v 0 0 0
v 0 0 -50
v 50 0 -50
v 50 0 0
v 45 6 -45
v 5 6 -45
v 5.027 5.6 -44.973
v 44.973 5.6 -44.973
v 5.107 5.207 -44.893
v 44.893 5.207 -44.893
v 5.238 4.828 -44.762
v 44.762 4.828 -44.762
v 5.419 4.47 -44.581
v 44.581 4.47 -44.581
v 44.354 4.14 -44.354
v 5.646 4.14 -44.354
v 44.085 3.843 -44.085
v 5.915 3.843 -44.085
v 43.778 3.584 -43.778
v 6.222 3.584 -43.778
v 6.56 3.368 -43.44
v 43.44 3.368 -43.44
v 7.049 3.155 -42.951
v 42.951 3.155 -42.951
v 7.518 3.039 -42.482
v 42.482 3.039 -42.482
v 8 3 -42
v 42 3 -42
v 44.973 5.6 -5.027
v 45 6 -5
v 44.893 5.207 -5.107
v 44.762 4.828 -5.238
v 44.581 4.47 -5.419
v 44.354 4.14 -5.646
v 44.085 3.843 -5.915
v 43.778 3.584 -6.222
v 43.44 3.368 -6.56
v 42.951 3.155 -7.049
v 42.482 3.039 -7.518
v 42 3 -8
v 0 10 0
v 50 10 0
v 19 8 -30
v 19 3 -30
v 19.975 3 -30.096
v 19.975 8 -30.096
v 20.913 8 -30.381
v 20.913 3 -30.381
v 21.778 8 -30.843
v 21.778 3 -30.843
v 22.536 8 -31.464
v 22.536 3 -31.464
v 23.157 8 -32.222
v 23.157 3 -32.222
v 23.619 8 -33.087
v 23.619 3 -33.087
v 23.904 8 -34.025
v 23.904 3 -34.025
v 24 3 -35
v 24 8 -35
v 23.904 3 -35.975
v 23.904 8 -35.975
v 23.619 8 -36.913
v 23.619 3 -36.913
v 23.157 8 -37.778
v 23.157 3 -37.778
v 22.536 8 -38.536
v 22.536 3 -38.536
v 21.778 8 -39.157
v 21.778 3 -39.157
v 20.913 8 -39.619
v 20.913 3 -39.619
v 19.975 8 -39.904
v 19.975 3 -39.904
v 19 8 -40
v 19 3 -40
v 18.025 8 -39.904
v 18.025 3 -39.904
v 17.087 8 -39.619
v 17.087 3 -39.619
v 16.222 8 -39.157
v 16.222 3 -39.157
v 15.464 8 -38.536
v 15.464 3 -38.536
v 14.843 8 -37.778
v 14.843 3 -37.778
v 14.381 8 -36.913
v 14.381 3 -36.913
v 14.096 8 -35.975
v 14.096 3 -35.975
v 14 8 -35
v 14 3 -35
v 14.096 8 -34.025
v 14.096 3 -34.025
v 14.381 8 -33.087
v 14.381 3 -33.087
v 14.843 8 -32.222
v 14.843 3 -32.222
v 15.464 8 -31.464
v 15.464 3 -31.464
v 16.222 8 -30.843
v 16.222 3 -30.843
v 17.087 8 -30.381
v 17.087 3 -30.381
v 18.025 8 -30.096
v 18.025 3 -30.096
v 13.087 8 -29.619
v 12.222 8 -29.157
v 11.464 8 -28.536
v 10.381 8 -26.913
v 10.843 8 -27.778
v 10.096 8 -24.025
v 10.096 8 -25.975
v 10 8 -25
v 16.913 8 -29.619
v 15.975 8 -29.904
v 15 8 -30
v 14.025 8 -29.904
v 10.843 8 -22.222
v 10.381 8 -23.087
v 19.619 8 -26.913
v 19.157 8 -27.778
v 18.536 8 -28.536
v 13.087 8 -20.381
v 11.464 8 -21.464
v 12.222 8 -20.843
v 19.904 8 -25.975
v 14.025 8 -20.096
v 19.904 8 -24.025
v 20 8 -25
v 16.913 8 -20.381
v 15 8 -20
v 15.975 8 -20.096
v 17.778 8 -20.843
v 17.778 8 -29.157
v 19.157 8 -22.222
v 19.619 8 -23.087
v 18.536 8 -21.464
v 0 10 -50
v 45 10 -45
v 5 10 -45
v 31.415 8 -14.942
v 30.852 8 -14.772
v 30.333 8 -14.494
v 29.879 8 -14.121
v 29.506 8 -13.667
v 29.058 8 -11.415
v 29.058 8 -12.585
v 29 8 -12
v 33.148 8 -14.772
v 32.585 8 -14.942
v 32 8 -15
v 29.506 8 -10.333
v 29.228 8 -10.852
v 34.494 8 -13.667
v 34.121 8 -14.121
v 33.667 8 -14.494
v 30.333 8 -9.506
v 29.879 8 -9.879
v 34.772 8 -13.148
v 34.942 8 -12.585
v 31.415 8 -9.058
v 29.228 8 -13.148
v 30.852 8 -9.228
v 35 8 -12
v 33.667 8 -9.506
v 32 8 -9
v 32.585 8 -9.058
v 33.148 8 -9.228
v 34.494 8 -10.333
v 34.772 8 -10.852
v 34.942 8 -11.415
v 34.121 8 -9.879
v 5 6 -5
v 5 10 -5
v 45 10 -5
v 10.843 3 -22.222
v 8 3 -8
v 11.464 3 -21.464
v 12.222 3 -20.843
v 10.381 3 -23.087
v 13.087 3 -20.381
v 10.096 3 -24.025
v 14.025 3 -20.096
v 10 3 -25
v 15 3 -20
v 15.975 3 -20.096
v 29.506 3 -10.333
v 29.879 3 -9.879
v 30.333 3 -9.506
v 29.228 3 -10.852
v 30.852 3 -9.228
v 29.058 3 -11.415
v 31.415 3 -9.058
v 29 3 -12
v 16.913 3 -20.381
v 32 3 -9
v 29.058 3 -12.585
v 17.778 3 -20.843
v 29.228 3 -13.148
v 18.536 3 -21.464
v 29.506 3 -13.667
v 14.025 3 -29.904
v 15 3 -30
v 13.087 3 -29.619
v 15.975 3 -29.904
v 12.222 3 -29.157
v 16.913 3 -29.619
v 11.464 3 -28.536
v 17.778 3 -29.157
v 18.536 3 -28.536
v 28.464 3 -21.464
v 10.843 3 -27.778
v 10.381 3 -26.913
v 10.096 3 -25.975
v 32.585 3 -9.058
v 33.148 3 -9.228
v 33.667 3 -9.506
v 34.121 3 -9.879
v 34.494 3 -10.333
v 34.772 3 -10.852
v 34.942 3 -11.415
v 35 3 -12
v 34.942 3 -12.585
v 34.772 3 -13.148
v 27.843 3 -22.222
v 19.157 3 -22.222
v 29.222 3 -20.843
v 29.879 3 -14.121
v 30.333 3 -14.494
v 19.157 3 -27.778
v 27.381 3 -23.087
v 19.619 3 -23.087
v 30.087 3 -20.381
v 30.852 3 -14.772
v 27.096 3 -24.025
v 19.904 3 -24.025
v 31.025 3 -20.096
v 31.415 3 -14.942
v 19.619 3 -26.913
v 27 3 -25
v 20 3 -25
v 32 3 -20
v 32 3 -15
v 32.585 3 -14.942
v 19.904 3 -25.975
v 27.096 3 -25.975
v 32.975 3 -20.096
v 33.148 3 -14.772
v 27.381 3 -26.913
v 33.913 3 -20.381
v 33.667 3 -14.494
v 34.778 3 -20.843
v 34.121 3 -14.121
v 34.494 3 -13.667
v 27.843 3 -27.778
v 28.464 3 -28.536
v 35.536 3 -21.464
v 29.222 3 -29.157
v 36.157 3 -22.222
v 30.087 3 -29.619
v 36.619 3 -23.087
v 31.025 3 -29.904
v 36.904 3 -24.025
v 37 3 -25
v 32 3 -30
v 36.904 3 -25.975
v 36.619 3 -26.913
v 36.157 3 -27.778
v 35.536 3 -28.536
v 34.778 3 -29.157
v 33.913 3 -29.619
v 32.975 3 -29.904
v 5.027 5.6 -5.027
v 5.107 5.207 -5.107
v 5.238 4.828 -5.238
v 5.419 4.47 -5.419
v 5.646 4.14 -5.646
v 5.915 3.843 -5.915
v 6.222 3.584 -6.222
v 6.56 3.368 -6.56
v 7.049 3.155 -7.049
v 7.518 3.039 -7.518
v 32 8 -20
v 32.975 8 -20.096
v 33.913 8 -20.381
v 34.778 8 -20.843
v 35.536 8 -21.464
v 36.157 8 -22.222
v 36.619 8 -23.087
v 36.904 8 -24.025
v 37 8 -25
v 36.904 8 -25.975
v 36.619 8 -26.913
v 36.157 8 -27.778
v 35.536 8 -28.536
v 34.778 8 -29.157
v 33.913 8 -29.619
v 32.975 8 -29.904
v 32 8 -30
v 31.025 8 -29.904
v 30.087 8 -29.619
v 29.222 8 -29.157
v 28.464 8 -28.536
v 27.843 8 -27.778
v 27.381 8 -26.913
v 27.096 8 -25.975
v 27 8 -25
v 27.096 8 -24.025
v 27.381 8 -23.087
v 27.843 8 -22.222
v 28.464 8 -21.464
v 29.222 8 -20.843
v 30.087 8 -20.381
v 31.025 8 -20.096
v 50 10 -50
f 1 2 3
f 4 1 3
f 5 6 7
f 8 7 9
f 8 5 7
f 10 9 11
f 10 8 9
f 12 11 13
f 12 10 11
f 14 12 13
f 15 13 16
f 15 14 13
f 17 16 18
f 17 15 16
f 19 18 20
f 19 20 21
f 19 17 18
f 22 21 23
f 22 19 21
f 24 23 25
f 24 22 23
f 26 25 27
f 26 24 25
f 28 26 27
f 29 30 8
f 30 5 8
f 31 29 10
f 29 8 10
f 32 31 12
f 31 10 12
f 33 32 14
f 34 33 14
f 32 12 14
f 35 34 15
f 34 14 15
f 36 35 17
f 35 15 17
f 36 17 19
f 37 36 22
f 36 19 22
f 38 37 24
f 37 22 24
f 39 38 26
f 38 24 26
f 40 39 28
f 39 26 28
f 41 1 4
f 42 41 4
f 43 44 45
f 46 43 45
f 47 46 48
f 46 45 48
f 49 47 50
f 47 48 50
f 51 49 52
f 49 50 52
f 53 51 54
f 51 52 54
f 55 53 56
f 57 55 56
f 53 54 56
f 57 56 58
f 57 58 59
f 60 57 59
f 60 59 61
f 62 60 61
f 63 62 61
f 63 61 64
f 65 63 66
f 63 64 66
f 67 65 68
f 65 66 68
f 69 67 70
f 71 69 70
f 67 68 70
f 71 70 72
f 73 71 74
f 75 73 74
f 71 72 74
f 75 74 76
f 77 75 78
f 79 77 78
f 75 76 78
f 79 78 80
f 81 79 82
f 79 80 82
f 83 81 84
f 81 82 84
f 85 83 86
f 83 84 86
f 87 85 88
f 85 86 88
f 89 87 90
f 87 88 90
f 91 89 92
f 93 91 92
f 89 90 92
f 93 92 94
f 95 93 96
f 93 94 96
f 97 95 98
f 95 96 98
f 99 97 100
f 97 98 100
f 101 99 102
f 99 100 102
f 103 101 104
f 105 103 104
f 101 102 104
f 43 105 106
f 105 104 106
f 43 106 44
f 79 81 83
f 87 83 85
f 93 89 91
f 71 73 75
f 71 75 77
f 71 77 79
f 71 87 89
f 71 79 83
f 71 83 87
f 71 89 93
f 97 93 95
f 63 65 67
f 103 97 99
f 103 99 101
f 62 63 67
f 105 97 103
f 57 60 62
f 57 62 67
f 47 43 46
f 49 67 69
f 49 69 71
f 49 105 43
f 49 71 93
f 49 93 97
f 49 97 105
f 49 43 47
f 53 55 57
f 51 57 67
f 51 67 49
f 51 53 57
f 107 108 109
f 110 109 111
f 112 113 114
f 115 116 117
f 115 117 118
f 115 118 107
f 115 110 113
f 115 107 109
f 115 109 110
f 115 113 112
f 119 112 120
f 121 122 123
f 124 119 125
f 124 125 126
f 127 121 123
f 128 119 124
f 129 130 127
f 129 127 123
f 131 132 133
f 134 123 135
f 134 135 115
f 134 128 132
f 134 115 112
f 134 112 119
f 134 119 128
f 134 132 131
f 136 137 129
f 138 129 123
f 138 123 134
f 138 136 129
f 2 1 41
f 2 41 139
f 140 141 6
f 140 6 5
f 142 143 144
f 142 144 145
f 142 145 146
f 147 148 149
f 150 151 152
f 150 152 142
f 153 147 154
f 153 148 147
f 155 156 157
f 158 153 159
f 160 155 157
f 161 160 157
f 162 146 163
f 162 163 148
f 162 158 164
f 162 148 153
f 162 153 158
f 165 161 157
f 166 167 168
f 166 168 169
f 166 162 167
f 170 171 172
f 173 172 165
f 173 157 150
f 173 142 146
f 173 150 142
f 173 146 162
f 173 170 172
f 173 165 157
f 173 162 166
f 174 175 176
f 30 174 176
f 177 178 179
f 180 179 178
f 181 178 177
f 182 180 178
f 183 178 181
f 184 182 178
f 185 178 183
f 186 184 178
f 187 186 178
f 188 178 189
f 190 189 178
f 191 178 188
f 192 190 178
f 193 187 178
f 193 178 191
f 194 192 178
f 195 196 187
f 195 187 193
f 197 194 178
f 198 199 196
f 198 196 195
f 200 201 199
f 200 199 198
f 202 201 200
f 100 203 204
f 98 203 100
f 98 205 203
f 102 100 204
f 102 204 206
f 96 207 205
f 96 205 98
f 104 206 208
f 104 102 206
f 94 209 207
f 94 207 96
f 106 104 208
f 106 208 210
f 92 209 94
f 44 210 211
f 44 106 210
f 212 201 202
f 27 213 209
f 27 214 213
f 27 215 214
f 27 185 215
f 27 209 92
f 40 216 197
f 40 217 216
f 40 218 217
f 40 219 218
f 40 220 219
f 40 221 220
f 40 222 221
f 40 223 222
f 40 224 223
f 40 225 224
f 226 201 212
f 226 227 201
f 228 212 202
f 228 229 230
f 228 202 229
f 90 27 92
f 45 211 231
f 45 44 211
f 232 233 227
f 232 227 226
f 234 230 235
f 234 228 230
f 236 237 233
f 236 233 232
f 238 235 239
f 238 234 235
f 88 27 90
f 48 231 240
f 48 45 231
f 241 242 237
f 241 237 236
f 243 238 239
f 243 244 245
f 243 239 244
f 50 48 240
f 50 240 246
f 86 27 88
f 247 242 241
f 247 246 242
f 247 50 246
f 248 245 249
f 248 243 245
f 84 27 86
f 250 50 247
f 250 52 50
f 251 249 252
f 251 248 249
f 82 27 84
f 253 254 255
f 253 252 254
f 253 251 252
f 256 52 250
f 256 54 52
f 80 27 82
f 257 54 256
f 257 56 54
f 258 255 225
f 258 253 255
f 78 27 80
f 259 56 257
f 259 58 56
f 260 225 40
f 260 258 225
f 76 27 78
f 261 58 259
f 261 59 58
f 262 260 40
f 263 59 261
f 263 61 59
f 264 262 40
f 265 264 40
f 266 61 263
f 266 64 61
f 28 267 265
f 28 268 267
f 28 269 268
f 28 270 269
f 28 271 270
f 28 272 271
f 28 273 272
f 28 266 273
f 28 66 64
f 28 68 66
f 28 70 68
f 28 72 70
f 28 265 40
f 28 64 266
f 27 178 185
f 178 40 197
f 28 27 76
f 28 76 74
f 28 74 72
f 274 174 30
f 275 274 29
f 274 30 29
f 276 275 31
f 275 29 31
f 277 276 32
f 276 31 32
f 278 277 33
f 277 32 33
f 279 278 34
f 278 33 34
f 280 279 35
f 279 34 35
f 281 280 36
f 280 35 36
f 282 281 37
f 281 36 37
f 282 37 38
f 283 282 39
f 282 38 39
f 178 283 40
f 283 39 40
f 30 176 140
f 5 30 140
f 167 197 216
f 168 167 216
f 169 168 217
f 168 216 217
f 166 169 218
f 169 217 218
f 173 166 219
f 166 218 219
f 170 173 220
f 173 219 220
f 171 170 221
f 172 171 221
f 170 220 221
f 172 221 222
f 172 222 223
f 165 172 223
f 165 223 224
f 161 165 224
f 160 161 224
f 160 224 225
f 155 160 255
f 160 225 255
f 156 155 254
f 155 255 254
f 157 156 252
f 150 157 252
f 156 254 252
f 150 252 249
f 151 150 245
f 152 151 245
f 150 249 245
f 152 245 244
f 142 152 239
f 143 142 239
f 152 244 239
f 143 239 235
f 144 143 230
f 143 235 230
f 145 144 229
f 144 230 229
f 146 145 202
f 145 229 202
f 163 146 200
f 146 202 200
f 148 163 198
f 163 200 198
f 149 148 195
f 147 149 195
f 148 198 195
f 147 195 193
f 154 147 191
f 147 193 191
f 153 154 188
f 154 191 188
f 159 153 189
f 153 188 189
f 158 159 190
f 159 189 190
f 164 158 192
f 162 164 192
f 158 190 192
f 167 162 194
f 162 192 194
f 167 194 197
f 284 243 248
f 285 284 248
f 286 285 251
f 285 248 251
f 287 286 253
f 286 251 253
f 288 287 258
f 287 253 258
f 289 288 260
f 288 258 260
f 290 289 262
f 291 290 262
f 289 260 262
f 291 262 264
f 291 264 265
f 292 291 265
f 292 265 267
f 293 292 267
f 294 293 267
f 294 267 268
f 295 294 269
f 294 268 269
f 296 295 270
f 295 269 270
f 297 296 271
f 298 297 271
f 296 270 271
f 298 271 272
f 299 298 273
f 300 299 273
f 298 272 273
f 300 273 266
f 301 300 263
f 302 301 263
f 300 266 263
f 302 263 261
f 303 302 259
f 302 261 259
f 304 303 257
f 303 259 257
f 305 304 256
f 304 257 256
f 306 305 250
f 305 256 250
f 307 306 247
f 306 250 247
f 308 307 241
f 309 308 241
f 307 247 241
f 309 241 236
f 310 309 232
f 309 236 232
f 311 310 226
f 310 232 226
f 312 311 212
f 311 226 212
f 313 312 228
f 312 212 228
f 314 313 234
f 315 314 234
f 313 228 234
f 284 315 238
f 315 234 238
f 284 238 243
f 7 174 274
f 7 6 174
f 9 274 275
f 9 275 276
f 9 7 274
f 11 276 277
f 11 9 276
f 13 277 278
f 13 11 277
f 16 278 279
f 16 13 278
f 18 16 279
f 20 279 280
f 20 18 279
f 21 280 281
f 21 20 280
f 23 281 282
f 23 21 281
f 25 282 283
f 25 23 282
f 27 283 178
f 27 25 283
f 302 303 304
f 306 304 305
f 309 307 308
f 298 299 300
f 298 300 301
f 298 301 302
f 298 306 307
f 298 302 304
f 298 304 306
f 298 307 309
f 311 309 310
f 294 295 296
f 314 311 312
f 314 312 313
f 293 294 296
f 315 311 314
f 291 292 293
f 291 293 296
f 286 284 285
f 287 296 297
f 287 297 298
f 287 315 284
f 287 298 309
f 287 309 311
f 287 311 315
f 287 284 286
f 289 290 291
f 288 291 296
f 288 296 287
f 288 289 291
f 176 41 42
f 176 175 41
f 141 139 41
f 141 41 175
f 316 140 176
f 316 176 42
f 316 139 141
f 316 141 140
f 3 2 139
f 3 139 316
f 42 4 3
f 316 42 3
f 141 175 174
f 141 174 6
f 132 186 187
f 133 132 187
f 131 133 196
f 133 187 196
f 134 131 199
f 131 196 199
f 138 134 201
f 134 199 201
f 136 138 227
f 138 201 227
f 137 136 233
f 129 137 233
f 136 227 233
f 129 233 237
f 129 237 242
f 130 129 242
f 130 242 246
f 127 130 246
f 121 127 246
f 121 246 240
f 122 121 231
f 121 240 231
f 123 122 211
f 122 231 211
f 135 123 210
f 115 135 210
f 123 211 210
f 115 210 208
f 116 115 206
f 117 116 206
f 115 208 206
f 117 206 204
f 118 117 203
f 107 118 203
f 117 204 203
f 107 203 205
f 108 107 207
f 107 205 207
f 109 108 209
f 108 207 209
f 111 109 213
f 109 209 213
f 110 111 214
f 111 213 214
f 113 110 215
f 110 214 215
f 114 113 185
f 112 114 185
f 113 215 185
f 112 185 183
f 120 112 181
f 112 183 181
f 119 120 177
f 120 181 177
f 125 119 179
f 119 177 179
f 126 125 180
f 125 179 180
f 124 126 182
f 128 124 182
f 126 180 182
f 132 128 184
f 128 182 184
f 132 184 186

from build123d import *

# Parameters (mm, degrees)
SKETCH1_W           = 50
SKETCH1_H           = 50
BOSS_EXTRUDE1_DEPTH = 10
SKETCH2_W           = 40
SKETCH2_H           = 40
CUT_EXTRUDE1_DEPTH  = 7
FILLET1_R           = 3
SKETCH3_R           = 5
SKETCH3_R_2         = 3
BOSS_EXTRUDE2_DEPTH = 5


with BuildPart() as part:
    # Sketch1 → Boss-Extrude1 (new body)
    with BuildSketch(Plane(origin=(0, 0, 0), x_dir=(1, 0, 0), z_dir=(0, 1, 0))):
        with Locations((25, 25)):
            Rectangle(SKETCH1_W, SKETCH1_H)
    extrude(amount=BOSS_EXTRUDE1_DEPTH)

    # Sketch2 → Cut-Extrude1 (cut)
    with BuildSketch(Plane(origin=(0, 10, 0), x_dir=(1, 0, 0), z_dir=(0, 1, 0))):
        with Locations((25, 25)):
            Rectangle(SKETCH2_W, SKETCH2_H)
    extrude(amount=-CUT_EXTRUDE1_DEPTH, mode=Mode.SUBTRACT)

    # Fillet1
    fillet1_edges = [part.edges().sort_by_distance(p)[0] for p in [
        (5, 3, -25),
        (25, 3, -45),
        (45, 3, -25),
        (25, 3, -5),
    ]]
    fillet(fillet1_edges, radius=FILLET1_R)

    # Sketch3 → Boss-Extrude2 (add)
    with BuildSketch(Plane(origin=(0, 3, 0), x_dir=(1, 0, 0), z_dir=(0, 1, 0))):
        with Locations(Location((19, 35, 0), (0, 0, 270))):
            Circle(SKETCH3_R)
        with Locations(Location((32, 25, 0), (0, 0, 270))):
            Circle(SKETCH3_R)
        with Locations(Location((15, 25, 0), (0, 0, 270))):
            Circle(SKETCH3_R)
        with Locations(Location((32, 12, 0), (0, 0, 270))):
            Circle(SKETCH3_R_2)
    extrude(amount=BOSS_EXTRUDE2_DEPTH)


solid = part.part
